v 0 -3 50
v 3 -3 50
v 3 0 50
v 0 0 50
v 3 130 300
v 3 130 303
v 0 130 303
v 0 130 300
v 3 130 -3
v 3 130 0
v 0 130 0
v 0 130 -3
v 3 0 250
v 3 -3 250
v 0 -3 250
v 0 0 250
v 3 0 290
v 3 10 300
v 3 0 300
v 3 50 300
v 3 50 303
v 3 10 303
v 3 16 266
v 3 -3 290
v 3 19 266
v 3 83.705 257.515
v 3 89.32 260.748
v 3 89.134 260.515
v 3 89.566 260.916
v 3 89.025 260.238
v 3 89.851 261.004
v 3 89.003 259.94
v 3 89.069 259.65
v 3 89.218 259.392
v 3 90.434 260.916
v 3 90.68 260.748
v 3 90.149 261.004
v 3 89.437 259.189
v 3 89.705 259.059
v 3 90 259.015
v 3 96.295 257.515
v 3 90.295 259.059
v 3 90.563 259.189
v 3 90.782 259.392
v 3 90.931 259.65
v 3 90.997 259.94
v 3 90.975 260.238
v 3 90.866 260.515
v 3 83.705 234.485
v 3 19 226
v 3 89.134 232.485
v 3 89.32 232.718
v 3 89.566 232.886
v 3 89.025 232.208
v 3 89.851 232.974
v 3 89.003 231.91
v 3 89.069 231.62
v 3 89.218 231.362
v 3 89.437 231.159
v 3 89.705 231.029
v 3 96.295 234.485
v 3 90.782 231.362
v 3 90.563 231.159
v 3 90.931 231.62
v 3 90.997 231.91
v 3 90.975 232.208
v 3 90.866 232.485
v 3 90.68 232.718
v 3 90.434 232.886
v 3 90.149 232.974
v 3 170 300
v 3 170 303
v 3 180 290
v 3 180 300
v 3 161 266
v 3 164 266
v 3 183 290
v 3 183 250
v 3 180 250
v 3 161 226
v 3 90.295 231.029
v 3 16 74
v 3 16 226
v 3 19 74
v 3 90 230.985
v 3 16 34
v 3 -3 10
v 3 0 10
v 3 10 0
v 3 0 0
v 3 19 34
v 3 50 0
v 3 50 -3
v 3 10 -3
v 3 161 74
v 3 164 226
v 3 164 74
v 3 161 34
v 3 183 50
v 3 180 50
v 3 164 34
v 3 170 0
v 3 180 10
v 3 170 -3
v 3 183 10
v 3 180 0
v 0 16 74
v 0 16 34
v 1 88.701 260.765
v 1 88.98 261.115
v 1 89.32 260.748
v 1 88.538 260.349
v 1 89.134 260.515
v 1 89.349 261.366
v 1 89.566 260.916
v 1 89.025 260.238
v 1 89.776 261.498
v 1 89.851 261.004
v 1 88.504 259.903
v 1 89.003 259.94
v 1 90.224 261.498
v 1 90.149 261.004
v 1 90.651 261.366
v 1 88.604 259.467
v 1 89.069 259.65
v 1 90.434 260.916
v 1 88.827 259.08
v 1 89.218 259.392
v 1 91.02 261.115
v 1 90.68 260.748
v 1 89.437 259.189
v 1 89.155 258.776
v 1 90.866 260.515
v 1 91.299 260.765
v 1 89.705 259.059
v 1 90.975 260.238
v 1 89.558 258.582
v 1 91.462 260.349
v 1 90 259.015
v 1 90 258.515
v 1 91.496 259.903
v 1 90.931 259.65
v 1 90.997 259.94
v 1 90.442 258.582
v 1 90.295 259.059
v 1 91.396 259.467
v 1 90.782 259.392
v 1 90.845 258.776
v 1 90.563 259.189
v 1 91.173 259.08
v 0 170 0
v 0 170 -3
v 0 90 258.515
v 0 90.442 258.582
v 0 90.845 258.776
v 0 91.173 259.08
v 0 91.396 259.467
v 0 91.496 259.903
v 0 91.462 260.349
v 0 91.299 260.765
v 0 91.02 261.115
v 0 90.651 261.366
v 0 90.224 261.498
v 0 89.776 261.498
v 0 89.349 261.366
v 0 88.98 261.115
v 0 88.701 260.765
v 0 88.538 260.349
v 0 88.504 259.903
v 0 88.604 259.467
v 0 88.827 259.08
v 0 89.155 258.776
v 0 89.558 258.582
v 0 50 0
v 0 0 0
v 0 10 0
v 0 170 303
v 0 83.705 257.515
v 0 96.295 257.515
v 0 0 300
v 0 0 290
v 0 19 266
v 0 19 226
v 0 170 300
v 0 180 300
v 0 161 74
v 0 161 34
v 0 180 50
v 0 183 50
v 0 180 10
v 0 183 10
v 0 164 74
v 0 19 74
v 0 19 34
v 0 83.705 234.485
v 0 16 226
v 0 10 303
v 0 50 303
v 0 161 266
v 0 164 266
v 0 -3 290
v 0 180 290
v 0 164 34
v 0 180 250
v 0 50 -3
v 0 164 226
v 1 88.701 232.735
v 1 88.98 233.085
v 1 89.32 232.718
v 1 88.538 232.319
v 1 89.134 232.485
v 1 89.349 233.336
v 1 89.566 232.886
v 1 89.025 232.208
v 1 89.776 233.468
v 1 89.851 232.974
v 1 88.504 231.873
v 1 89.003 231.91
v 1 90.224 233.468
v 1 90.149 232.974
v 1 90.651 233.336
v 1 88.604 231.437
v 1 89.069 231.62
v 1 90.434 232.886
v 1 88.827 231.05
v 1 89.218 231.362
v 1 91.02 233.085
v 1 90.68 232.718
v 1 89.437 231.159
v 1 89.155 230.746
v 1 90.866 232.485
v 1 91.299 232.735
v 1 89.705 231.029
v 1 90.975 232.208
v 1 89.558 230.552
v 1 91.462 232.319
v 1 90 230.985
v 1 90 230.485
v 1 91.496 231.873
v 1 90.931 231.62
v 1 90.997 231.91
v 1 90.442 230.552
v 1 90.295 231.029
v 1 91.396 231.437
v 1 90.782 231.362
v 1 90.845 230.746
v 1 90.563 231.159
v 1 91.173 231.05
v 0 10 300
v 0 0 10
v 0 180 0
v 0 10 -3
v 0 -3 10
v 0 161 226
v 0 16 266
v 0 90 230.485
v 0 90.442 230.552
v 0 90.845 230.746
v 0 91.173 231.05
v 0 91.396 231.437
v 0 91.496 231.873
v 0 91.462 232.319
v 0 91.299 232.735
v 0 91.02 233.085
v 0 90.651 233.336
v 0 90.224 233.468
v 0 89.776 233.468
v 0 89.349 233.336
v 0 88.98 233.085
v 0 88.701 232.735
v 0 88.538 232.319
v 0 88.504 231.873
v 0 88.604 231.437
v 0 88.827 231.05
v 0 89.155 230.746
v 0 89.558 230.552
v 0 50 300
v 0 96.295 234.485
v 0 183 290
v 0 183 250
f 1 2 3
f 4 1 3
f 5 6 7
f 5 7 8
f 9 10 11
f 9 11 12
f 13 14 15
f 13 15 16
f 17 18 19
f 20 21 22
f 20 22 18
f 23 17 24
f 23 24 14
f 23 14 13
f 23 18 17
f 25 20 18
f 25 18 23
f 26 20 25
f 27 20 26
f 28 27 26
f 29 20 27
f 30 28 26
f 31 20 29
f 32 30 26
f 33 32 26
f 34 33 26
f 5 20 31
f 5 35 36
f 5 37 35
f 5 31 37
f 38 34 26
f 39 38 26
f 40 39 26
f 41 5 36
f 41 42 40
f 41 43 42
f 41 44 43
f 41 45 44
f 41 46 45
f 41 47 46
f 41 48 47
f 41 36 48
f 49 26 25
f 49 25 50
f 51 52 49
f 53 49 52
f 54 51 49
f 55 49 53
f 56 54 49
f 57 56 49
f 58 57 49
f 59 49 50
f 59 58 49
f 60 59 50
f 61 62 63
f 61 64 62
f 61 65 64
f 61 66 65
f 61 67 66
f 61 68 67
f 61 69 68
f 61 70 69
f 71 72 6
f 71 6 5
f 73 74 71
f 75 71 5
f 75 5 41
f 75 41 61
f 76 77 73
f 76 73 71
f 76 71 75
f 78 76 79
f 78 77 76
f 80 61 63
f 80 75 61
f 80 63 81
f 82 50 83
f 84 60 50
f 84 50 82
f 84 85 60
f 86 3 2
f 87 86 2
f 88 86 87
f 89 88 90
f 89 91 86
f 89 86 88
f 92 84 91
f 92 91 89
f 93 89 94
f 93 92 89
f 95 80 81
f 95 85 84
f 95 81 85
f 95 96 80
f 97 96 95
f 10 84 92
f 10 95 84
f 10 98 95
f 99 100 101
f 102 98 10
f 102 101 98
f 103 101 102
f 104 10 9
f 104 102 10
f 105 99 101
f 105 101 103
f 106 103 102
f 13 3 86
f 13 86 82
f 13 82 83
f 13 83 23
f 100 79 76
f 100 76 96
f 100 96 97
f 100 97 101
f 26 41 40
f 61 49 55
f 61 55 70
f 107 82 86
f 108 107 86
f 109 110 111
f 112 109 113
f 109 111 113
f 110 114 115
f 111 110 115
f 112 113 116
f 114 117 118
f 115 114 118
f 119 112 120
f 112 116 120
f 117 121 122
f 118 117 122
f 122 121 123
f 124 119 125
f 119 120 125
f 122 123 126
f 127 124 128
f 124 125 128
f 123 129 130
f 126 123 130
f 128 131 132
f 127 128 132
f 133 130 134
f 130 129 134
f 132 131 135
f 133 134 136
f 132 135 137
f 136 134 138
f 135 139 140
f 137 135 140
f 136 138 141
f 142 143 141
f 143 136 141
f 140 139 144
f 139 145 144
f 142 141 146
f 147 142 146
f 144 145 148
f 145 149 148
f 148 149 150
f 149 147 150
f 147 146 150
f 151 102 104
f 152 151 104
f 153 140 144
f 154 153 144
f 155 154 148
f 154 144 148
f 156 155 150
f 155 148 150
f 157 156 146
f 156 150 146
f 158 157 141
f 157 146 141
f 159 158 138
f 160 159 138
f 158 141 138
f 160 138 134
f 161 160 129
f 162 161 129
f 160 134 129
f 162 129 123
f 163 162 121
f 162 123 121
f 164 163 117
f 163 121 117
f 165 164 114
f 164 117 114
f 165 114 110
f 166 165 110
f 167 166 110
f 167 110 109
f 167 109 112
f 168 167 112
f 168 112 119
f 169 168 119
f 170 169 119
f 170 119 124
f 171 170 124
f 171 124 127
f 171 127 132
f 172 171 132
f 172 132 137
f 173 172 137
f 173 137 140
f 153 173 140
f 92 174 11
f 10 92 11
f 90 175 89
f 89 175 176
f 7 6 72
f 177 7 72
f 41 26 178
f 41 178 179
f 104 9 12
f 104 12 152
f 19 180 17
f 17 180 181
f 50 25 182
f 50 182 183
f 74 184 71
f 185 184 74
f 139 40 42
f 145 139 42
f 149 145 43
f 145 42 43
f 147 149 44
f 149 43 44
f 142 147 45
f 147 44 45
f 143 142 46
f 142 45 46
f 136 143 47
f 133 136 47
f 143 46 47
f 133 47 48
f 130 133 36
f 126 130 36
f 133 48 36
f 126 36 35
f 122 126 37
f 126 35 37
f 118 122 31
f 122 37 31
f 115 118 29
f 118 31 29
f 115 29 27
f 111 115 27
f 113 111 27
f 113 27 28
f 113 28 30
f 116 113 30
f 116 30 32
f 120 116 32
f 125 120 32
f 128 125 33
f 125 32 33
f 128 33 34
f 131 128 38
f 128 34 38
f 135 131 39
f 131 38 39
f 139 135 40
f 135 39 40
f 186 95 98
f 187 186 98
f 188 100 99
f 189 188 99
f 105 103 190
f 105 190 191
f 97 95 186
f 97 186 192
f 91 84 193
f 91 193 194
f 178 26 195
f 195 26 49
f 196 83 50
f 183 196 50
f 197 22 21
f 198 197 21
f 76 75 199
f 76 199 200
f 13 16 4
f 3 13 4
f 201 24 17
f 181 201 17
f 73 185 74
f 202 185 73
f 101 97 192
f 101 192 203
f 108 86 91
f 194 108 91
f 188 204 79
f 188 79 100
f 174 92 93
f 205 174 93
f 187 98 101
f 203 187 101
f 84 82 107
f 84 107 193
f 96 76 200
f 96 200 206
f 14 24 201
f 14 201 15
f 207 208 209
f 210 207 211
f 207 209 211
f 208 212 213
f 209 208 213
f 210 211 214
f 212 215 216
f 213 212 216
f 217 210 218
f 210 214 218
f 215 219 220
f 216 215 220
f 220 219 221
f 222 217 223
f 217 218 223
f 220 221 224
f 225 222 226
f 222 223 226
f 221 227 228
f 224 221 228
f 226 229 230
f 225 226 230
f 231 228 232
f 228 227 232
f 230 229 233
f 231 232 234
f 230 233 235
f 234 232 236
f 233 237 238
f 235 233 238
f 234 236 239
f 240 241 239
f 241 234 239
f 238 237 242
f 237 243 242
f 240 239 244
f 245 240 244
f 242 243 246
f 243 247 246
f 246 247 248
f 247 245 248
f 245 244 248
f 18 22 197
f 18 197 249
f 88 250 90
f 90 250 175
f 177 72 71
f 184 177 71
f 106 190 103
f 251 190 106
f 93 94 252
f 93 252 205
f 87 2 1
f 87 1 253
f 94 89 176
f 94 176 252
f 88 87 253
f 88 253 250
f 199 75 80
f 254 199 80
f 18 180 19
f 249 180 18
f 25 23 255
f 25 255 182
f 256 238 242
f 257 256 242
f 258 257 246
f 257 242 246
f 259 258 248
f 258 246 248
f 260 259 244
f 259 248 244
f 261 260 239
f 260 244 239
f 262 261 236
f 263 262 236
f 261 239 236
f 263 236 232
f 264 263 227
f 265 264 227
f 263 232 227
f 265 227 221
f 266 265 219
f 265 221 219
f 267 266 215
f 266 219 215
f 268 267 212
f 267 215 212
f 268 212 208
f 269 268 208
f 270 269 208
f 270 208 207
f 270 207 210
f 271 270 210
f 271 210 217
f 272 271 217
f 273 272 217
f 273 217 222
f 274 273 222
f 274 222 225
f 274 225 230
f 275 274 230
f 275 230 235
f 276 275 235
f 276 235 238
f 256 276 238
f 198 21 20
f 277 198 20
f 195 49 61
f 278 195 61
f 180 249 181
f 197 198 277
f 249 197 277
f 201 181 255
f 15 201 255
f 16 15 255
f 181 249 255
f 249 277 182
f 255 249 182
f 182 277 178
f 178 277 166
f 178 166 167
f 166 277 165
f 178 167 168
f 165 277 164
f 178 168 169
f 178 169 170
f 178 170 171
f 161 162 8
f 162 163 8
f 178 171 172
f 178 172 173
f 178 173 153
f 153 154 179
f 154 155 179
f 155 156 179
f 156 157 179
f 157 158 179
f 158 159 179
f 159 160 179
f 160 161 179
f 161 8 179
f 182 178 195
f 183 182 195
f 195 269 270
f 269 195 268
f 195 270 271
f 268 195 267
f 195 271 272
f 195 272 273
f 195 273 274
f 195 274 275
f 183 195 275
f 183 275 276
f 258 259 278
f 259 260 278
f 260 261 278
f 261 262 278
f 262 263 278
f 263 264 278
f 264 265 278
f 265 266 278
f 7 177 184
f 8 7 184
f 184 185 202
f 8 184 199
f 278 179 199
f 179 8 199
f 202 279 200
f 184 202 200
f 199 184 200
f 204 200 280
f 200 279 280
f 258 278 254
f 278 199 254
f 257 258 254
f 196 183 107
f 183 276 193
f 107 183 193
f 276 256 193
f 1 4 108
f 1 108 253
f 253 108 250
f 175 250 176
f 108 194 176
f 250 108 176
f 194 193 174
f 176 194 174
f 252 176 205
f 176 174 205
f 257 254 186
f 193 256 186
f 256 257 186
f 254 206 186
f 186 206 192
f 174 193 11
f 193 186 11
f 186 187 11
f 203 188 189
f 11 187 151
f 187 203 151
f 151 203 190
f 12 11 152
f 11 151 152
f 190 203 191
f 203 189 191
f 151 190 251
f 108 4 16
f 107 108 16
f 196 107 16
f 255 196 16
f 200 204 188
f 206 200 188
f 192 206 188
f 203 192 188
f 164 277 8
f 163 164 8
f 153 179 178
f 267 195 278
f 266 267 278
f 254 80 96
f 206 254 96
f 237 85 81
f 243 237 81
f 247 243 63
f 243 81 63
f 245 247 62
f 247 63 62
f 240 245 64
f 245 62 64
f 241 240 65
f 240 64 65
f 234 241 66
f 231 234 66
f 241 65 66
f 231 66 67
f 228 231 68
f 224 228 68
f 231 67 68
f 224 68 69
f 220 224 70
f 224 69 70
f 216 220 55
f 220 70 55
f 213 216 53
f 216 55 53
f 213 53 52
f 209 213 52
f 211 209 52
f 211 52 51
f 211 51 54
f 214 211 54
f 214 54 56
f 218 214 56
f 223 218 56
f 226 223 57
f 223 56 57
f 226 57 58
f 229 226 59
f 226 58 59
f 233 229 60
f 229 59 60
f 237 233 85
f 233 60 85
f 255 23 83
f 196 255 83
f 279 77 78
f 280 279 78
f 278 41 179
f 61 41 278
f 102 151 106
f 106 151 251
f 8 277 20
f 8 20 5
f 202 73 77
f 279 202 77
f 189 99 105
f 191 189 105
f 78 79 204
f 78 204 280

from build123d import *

# Parameters (mm, degrees)
SKETCH1_W           = 300
SKETCH1_H           = 180
BOSS_EXTRUDE1_DEPTH = 3
SKETCH2_W           = 40
SKETCH2_H           = 3
SKETCH2_W_2         = 3
SKETCH2_H_2         = 40
BOSS_EXTRUDE2_DEPTH = 3
SKETCH3_W           = 40
SKETCH3_H           = 3
CUT_EXTRUDE1_DEPTH  = 354.987287907
SKETCH4_W           = 40
SKETCH4_H           = 3
CUT_EXTRUDE2_DEPTH  = 3
SKETCH5_W           = 40
SKETCH5_H           = 3
CUT_EXTRUDE3_DEPTH  = 3
SKETCH6_W           = 40
SKETCH6_H           = 3
CUT_EXTRUDE4_DEPTH  = 3
SKETCH8_W           = 23.03
SKETCH8_H           = 12.59
CUT_EXTRUDE5_DEPTH  = 10
SKETCH9_R           = 1
CUT_EXTRUDE6_DEPTH  = 2
SKETCH12_R          = 1.5
CUT_EXTRUDE7_DEPTH  = 10
SKETCH13_R          = 1.5
CUT_EXTRUDE8_DEPTH  = 10


with BuildPart() as part:
    # Sketch1 → Boss-Extrude1 (new body)
    with BuildSketch(Plane(origin=(0, 0, 0), x_dir=(0, 0, -1), z_dir=(1, 0, 0))):
        with Locations((-150, 90)):
            Rectangle(SKETCH1_W, SKETCH1_H)
    extrude(amount=BOSS_EXTRUDE1_DEPTH)

    # Sketch2 → Boss-Extrude2 (add)
    with BuildSketch(Plane(origin=(3, 0, 0), x_dir=(0, 0, -1), z_dir=(1, 0, 0))):
        with Locations((-270, 181.5)):
            Rectangle(SKETCH2_W, SKETCH2_H)
        with Locations((-30, 181.5)):
            Rectangle(SKETCH2_W, SKETCH2_H)
        with Locations((1.5, 150)):
            Rectangle(SKETCH2_W_2, SKETCH2_H_2)
        with Locations((1.5, 30)):
            Rectangle(SKETCH2_W_2, SKETCH2_H_2)
        with Locations((-30, -1.5)):
            Rectangle(SKETCH2_W, SKETCH2_H)
        with Locations((-270, -1.5)):
            Rectangle(SKETCH2_W, SKETCH2_H)
        with Locations((-301.5, 150)):
            Rectangle(SKETCH2_W_2, SKETCH2_H_2)
        with Locations((-301.5, 30)):
            Rectangle(SKETCH2_W_2, SKETCH2_H_2)
    extrude(amount=-BOSS_EXTRUDE2_DEPTH)

    # Sketch3 → Cut-Extrude1 (cut, through all)
    with BuildSketch(Plane(origin=(3, 0, 0), x_dir=(0, 0, -1), z_dir=(1, 0, 0))):
        with Locations((-246, 162.5)):
            Rectangle(SKETCH3_W, SKETCH3_H)
    extrude(amount=-CUT_EXTRUDE1_DEPTH, mode=Mode.SUBTRACT)

    # Sketch4 → Cut-Extrude2 (cut)
    with BuildSketch(Plane(origin=(3, 0, 0), x_dir=(0, 0, -1), z_dir=(1, 0, 0))):
        with Locations((-54, 162.5)):
            Rectangle(SKETCH4_W, SKETCH4_H)
    extrude(amount=-CUT_EXTRUDE2_DEPTH, mode=Mode.SUBTRACT)

    # Sketch5 → Cut-Extrude3 (cut)
    with BuildSketch(Plane(origin=(3, 0, 0), x_dir=(0, 0, -1), z_dir=(1, 0, 0))):
        with Locations((-246, 17.5)):
            Rectangle(SKETCH5_W, SKETCH5_H)
    extrude(amount=-CUT_EXTRUDE3_DEPTH, mode=Mode.SUBTRACT)

    # Sketch6 → Cut-Extrude4 (cut)
    with BuildSketch(Plane(origin=(3, 0, 0), x_dir=(0, 0, -1), z_dir=(1, 0, 0))):
        with Locations((-54, 17.5)):
            Rectangle(SKETCH6_W, SKETCH6_H)
    extrude(amount=-CUT_EXTRUDE4_DEPTH, mode=Mode.SUBTRACT)

    # Sketch8 → Cut-Extrude5 (cut)
    with BuildSketch(Plane(origin=(3, 0, 0), x_dir=(0, 0, -1), z_dir=(1, 0, 0))):
        with Locations((-246, 90)):
            Rectangle(SKETCH8_W, SKETCH8_H)
    extrude(amount=-CUT_EXTRUDE5_DEPTH, mode=Mode.SUBTRACT)

    # Sketch9 → Cut-Extrude6 (cut)
    with BuildSketch(Plane(origin=(3, 0, 0), x_dir=(0, 0, -1), z_dir=(1, 0, 0))):
        with Locations((-260.015, 90)):
            Circle(SKETCH9_R)
        with Locations((-231.985, 90)):
            Circle(SKETCH9_R)
    extrude(amount=-CUT_EXTRUDE6_DEPTH, mode=Mode.SUBTRACT)

    # Sketch12 → Cut-Extrude7 (cut)
    with BuildSketch(Plane(origin=(1, 0, 0), x_dir=(0, 0, -1), z_dir=(1, 0, 0))):
        with Locations((-260.015, 90)):
            Circle(SKETCH12_R)
    extrude(amount=-CUT_EXTRUDE7_DEPTH, mode=Mode.SUBTRACT)

    # Sketch13 → Cut-Extrude8 (cut)
    with BuildSketch(Plane(origin=(1, 0, 0), x_dir=(0, 0, -1), z_dir=(1, 0, 0))):
        with Locations((-231.985, 90)):
            Circle(SKETCH13_R)
    extrude(amount=-CUT_EXTRUDE8_DEPTH, mode=Mode.SUBTRACT)


solid = part.part
